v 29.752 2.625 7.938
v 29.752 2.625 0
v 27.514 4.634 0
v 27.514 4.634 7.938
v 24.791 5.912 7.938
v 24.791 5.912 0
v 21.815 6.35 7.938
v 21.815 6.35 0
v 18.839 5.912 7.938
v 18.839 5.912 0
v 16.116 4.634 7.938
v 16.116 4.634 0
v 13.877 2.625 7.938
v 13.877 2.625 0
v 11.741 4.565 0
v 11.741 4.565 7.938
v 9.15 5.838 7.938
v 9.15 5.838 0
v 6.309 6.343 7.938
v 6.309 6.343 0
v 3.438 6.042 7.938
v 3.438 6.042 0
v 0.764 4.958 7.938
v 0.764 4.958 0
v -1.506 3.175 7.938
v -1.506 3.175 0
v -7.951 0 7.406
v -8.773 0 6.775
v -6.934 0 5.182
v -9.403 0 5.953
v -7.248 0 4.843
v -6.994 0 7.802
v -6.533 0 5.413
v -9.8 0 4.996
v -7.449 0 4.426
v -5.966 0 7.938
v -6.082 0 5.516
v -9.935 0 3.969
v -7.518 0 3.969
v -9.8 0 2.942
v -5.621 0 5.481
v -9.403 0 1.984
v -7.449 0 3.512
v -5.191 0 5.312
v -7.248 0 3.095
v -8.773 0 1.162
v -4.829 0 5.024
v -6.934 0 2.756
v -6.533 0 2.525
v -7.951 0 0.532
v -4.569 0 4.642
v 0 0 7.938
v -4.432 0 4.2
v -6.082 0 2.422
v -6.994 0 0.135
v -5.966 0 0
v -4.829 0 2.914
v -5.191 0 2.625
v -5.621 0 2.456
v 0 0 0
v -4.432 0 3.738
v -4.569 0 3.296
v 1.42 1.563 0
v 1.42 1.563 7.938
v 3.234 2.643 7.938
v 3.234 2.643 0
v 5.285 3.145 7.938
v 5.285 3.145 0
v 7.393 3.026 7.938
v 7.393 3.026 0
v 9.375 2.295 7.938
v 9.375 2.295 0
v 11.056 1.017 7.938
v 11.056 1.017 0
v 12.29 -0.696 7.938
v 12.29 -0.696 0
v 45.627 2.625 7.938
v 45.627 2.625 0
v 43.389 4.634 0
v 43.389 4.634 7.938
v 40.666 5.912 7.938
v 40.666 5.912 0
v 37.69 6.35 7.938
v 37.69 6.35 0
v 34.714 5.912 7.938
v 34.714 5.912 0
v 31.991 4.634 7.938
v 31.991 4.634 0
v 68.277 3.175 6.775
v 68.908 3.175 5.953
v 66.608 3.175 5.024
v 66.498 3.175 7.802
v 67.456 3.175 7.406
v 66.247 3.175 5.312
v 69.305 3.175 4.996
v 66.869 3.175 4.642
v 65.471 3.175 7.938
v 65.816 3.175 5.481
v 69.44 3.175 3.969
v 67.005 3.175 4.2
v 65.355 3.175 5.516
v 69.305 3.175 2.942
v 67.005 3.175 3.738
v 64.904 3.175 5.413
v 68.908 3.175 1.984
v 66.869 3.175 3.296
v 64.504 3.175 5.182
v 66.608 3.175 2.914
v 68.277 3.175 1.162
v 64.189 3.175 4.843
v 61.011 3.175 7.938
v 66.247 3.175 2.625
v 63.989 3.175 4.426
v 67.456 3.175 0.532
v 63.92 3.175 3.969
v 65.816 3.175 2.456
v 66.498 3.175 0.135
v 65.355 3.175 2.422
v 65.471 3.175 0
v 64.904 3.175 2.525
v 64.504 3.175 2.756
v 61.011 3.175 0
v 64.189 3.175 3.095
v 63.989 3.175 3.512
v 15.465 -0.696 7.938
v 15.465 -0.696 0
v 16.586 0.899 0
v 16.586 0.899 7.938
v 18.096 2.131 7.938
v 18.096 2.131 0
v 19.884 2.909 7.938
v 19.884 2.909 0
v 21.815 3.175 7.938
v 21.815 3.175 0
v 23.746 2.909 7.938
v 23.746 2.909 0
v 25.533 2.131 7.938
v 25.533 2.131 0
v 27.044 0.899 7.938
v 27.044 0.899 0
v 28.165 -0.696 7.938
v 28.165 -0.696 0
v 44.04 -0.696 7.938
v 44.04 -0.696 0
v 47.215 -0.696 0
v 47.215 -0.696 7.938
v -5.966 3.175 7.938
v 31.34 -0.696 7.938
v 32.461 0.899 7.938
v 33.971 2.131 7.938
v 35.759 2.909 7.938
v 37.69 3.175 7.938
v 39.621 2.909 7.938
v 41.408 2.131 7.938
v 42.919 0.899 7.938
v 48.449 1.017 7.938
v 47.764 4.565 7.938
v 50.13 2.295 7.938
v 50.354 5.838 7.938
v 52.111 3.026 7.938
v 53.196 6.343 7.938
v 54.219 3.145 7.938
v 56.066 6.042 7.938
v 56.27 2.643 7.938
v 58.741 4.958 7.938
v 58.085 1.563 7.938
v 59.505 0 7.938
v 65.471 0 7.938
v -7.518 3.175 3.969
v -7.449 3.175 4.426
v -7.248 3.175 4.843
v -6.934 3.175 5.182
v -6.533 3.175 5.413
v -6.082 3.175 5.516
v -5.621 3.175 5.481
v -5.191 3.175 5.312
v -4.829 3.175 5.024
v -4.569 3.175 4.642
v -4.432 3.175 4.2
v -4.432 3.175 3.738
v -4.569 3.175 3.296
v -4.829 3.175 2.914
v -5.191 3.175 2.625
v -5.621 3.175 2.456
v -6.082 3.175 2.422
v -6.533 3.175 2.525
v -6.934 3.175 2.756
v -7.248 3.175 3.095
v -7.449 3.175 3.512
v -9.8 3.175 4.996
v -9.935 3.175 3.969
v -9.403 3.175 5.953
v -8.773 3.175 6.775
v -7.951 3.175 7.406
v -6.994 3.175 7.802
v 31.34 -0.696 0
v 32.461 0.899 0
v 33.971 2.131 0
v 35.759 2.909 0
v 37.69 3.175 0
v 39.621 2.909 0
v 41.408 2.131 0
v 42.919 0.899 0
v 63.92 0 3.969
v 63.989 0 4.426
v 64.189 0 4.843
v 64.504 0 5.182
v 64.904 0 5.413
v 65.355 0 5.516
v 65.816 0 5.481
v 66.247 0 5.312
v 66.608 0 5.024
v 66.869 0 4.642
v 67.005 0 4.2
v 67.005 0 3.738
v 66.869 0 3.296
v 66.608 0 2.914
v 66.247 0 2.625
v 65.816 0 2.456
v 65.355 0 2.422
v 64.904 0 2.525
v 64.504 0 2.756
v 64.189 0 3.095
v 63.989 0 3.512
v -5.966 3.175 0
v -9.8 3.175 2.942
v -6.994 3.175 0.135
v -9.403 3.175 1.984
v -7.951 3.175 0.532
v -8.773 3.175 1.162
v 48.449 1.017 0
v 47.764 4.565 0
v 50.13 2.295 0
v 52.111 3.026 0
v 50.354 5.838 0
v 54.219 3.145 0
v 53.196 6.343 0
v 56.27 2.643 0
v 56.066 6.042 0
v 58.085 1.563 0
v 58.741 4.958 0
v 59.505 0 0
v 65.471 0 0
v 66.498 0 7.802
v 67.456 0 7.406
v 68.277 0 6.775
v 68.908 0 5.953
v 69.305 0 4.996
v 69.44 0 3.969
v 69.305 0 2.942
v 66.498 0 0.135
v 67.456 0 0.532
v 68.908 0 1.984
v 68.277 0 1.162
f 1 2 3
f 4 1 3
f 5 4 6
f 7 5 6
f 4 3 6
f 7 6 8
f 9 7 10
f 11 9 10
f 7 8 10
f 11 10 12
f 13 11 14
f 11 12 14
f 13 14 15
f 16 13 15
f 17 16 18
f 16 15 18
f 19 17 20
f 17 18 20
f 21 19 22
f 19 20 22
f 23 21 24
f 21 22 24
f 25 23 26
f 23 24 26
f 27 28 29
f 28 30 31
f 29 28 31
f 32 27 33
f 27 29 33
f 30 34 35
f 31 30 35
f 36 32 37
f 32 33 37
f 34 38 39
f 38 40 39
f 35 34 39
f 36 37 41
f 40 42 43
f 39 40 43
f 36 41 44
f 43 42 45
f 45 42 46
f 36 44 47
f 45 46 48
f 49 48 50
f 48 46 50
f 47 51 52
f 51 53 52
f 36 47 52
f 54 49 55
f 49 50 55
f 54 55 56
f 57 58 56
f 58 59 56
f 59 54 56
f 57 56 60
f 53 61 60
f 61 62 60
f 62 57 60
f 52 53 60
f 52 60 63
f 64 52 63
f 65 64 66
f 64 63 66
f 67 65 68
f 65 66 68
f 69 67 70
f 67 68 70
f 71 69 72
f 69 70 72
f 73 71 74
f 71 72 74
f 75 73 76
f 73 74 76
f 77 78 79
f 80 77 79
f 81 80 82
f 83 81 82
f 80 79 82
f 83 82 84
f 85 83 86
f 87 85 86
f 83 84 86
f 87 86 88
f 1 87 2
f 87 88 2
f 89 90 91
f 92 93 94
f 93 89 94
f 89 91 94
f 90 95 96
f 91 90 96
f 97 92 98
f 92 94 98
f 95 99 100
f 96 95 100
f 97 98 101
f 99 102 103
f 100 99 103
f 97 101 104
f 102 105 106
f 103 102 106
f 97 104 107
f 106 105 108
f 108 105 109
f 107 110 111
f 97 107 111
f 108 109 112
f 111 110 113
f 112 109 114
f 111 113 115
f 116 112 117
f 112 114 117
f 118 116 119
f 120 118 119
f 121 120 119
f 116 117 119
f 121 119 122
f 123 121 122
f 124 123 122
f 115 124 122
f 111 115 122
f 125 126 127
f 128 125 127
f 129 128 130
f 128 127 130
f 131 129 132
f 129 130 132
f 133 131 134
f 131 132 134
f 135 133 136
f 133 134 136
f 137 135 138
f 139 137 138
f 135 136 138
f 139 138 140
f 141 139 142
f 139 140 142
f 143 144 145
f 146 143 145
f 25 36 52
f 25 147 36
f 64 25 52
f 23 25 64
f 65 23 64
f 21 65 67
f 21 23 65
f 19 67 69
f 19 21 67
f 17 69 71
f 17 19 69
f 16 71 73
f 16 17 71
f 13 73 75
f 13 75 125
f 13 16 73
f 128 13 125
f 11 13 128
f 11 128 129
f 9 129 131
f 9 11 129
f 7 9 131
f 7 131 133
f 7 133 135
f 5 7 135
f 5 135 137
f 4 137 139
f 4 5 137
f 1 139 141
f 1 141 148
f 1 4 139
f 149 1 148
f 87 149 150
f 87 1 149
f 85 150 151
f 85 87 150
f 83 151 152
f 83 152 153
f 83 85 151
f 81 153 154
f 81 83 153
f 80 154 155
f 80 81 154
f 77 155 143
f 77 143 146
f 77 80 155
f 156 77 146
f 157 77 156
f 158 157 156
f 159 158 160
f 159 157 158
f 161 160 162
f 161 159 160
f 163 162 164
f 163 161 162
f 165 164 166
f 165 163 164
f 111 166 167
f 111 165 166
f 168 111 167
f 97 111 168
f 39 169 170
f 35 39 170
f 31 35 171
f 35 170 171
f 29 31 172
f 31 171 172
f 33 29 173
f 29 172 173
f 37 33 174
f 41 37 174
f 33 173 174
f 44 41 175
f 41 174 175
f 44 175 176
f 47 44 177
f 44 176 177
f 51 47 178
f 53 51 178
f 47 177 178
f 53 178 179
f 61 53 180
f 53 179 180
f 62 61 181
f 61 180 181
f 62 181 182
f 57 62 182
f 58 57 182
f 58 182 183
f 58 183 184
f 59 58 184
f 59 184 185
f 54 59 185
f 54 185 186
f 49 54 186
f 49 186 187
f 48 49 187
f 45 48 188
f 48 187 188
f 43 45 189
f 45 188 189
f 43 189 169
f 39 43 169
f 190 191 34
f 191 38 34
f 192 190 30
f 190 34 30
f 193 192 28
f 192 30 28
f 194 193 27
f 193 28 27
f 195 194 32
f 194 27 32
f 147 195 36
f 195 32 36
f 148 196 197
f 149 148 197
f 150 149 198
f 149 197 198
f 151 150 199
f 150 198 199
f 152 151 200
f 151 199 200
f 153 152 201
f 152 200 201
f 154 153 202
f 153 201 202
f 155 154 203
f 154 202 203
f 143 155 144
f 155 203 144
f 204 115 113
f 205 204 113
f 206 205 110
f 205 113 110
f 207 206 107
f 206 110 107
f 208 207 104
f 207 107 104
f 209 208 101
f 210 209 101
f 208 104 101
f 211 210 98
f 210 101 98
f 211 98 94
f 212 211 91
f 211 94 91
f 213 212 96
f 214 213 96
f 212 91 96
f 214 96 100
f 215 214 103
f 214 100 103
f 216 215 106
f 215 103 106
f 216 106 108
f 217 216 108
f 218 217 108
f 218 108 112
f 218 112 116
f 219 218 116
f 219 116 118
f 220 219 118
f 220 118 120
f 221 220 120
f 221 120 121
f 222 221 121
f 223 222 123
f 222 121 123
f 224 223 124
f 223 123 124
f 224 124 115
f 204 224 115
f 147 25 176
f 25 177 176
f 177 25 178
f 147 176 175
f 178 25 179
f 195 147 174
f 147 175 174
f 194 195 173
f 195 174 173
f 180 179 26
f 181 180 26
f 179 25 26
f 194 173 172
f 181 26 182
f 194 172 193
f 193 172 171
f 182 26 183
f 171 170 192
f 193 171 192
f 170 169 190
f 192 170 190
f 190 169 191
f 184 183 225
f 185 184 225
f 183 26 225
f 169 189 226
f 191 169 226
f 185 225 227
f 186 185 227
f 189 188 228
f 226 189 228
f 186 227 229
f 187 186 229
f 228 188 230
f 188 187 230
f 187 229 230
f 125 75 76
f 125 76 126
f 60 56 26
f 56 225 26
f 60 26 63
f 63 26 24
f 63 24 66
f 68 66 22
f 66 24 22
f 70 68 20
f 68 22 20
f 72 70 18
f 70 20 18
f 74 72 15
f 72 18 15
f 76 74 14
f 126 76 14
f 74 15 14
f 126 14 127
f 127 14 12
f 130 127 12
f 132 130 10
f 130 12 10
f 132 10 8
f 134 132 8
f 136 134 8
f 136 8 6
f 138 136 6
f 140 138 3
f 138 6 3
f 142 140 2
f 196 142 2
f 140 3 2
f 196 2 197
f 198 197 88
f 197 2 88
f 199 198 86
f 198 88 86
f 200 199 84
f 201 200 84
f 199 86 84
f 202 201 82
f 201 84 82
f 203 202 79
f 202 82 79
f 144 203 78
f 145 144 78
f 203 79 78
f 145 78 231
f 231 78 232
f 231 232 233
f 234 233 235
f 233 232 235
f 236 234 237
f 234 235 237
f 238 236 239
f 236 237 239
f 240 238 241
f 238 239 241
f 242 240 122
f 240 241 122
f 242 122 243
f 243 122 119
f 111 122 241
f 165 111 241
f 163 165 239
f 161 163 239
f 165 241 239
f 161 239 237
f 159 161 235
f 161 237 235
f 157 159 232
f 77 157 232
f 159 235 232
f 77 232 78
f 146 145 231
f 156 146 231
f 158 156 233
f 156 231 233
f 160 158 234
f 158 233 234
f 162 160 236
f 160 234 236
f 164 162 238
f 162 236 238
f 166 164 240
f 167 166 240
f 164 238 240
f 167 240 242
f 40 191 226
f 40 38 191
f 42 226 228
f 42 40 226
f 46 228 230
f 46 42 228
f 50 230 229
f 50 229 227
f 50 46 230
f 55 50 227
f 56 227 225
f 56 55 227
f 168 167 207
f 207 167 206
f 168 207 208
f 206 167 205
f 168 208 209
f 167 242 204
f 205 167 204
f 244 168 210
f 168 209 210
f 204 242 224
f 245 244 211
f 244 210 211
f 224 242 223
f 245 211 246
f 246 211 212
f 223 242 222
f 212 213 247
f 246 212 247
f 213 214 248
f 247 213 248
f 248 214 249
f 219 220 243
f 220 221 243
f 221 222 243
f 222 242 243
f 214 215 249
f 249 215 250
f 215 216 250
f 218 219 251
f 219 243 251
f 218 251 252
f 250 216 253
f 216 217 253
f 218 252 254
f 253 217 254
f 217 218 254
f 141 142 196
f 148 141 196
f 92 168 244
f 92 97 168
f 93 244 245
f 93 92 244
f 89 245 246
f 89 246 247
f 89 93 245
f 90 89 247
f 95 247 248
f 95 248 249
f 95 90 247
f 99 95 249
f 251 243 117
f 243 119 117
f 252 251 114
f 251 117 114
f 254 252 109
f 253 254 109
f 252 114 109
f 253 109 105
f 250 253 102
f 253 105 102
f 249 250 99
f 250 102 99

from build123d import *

# Parameters (mm, degrees)
F1_DEPTH = 7.9375
F2_R     = 1.5512489022
F3_DEPTH = 3.175
F4_R     = 3.175
F5_DEPTH = 25.4
F6_R     = 3.96874


# Not quite as in the source:
# - a fillet or chamfer is up to 0.001 mm smaller than in the source, because OpenCascade refuses the exact size


with BuildPart() as f1:
    # F0 (on Top) → F1 (new body)
    with BuildSketch(Plane.XY):
        with BuildLine():
            Line((-9.9351188985, 0), (0, 0))
            ThreePointArc((0, 0), (6.3438186296, 3.1635706978), (12.2898811015, -0.6960349097))
            Line((12.2898811015, -0.6960349097), (15.4648811015, -0.6960349097))
            ThreePointArc((15.4648811015, -0.6960349097), (21.8148811015, 3.175), (28.1648811015, -0.6960349097))
            Line((28.1648811015, -0.6960349097), (31.3398811015, -0.6960349097))
            ThreePointArc((31.3398811015, -0.6960349097), (37.6898811015, 3.175), (44.0398811015, -0.6960349097))
            Line((44.0398811015, -0.6960349097), (47.2148811015, -0.6960349097))
            ThreePointArc((47.2148811015, -0.6960349097), (53.1609435734, 3.1635706978), (59.504762203, 0))
            Line((59.504762203, 0), (69.4398811015, 0))
            Line((69.4398811015, 0), (69.4398811015, 3.175))
            Line((69.4398811015, 3.175), (61.0109161202, 3.175))
            ThreePointArc((61.0109161202, 3.175), (53.1959495352, 6.3434025911), (45.6273811015, 2.6246326912))
            ThreePointArc((45.6273811015, 2.6246326912), (37.6898811015, 6.35), (29.7523811015, 2.6246326912))
            ThreePointArc((29.7523811015, 2.6246326912), (21.8148811015, 6.35), (13.8773811015, 2.6246326912))
            ThreePointArc((13.8773811015, 2.6246326912), (6.3088126678, 6.3434025911), (-1.5061539172, 3.175))
            Line((-1.5061539172, 3.175), (-9.9351188985, 3.175))
            Line((-9.9351188985, 3.175), (-9.9351188985, 0))
        make_face()
    extrude(amount=F1_DEPTH)

    # F2 (on face) → F3 (cut, through all)
    with BuildSketch(Plane(origin=(0, 3.175, 0), x_dir=(-1, 0, 0), z_dir=(0, 1, 0))):
        with Locations((5.9663688985, 3.96875)):
            Circle(F2_R)
        with Locations((-65.4711311015, 3.96875)):
            Circle(F2_R)
    extrude(amount=-F3_DEPTH, mode=Mode.SUBTRACT)

    # F4 (on face) → F5 (cut)
    with BuildSketch(Plane(origin=(0, 3.175, 0), x_dir=(-1, 0, 0), z_dir=(0, 1, 0))):
        with Locations((5.9663688985, 3.96875)):
            Circle(F4_R)
        with Locations((-65.4711311015, 3.96875)):
            Circle(F4_R)
    extrude(amount=F5_DEPTH, mode=Mode.SUBTRACT)

    # F6 (radius 3.96875 in the source; OpenCascade refuses exactly that, so slightly less here)
    f6_edges = [f1.edges().sort_by_distance(p)[0] for p in [
        (69.439881, 1.5875, 7.9375),
        (69.439881, 1.5875, 0),
        (-9.935119, 1.5875, 7.9375),
        (-9.935119, 1.5875, 0),
    ]]
    fillet(f6_edges, radius=F6_R)


solid = f1.part
